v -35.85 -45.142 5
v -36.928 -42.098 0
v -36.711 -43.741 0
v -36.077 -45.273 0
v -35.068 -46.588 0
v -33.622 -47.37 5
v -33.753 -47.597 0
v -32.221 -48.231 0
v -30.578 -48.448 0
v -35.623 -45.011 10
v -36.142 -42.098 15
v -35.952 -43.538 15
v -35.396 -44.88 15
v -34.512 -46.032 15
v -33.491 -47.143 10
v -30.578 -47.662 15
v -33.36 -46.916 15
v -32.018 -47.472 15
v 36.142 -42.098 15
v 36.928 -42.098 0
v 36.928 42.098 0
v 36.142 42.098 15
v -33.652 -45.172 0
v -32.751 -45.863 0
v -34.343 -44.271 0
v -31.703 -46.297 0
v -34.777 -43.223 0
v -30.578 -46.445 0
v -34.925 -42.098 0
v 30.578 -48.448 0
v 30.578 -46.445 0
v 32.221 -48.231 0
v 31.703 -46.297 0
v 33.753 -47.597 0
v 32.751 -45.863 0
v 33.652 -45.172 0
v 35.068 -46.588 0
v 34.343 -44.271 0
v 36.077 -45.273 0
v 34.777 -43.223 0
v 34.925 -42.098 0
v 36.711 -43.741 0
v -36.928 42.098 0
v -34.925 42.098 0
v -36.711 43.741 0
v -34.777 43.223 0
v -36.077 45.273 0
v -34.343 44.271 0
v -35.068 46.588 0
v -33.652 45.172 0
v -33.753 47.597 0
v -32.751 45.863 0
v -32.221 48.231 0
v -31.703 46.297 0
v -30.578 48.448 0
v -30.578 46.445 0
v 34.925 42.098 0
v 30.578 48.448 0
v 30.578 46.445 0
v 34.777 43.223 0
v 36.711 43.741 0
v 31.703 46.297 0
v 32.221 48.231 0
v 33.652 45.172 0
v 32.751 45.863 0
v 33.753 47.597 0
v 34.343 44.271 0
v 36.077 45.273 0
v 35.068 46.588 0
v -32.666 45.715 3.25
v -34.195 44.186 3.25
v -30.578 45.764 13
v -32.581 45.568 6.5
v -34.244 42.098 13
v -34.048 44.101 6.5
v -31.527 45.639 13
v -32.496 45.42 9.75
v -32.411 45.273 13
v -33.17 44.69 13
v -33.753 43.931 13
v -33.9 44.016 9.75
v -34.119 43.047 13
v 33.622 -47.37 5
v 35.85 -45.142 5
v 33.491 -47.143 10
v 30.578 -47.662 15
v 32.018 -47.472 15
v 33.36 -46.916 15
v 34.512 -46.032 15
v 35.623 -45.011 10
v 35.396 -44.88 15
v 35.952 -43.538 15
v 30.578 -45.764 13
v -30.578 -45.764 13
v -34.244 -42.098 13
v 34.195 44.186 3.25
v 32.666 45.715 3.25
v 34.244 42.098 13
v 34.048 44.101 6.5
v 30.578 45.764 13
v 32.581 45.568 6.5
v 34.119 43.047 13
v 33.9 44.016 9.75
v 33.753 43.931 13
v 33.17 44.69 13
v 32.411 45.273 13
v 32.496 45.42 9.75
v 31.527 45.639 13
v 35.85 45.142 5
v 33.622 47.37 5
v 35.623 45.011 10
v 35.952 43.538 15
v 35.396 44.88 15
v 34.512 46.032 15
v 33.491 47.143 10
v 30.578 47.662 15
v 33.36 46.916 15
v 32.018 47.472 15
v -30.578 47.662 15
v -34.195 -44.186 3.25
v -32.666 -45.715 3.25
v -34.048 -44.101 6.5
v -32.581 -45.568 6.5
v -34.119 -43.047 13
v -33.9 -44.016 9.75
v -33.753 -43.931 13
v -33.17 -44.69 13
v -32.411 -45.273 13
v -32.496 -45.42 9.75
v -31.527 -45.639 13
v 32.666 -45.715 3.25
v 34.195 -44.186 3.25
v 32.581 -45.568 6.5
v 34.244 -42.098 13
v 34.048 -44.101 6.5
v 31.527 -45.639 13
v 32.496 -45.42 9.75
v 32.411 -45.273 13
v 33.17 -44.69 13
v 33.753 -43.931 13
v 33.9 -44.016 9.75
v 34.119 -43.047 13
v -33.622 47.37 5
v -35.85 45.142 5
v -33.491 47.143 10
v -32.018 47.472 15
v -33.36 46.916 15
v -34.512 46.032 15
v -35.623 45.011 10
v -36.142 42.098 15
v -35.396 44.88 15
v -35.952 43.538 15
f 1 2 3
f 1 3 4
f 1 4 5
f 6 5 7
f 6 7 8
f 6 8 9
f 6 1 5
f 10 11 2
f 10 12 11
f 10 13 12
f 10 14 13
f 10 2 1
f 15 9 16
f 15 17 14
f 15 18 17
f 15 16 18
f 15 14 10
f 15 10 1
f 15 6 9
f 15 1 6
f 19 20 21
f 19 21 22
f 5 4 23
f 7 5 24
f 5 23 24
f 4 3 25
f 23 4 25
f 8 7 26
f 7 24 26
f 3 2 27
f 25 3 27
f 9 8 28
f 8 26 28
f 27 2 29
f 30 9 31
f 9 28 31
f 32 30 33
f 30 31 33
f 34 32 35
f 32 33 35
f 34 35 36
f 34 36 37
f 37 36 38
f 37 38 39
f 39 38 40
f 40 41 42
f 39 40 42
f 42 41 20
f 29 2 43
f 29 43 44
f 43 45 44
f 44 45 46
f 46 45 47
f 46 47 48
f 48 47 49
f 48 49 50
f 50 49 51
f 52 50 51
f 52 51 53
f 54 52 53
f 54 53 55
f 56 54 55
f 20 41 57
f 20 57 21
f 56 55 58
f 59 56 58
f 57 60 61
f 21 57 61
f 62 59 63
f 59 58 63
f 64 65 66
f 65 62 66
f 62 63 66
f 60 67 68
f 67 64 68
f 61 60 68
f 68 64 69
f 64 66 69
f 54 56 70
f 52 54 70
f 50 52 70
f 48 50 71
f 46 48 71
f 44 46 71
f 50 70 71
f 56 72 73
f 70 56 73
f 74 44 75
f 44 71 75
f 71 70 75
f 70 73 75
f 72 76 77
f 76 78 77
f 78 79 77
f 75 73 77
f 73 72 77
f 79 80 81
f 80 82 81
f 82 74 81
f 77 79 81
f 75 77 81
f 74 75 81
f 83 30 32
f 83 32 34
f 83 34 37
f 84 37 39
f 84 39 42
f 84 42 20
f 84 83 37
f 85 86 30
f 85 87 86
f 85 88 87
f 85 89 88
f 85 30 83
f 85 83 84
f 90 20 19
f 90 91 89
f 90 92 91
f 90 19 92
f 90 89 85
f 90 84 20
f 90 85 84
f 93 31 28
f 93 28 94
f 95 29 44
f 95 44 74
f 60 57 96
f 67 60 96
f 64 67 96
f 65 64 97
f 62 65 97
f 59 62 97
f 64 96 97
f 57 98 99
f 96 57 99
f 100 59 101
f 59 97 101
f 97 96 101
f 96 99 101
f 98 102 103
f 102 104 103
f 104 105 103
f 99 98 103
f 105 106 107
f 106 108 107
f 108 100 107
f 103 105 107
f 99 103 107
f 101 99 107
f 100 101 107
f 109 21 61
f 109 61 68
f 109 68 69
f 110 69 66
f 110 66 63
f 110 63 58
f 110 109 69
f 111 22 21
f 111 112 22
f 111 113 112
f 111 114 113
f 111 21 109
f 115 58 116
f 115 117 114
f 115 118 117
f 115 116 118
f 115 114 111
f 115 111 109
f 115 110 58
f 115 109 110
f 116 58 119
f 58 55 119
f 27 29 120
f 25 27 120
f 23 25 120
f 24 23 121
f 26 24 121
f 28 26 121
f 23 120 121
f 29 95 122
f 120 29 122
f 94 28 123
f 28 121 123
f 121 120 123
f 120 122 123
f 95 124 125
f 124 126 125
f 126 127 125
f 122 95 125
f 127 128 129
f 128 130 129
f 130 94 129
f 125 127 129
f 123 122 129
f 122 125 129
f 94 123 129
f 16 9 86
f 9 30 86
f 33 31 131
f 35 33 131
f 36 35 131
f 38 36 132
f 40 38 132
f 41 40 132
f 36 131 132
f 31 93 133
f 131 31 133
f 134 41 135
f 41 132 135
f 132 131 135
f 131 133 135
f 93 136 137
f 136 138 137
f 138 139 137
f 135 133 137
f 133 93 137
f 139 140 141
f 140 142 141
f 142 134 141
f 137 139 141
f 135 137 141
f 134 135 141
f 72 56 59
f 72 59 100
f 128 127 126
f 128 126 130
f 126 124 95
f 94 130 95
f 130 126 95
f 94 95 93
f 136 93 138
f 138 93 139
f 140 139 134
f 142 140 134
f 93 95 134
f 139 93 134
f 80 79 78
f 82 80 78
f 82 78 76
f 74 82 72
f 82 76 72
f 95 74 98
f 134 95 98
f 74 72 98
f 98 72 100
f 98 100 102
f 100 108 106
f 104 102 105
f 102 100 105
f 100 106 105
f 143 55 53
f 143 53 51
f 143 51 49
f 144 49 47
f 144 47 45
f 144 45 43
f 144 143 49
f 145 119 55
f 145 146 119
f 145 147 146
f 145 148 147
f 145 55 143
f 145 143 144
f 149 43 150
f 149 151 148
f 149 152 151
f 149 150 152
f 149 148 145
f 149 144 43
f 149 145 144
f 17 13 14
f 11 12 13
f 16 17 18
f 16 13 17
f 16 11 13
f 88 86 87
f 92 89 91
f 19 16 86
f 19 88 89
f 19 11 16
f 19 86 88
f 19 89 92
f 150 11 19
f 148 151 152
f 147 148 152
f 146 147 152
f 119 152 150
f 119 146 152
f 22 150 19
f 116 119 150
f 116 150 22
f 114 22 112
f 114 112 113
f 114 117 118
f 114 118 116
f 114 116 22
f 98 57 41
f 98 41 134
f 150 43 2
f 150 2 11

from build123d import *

# Parameters (mm, degrees)
F1_DEPTH = 15
F1_TAPER = 3
F2_T     = -2


with BuildPart() as f1:
    # F0 (on Top) → F1 (new body)
    with BuildSketch(Plane.XY):
        with BuildLine():
            ThreePointArc((36.9276963174, 42.0978697181), (35.067824378, 46.5879977786), (30.5776963174, 48.4478697181))
            Line((30.5776963174, 48.4478697181), (-30.5776963174, 48.4478697181))
            ThreePointArc((-30.5776963174, 48.4478697181), (-35.067824378, 46.5879977786), (-36.9276963174, 42.0978697181))
            Line((-36.9276963174, 42.0978697181), (-36.9276963174, -42.0978697181))
            ThreePointArc((-36.9276963174, -42.0978697181), (-35.067824378, -46.5879977786), (-30.5776963174, -48.4478697181))
            Line((-30.5776963174, -48.4478697181), (30.5776963174, -48.4478697181))
            ThreePointArc((30.5776963174, -48.4478697181), (35.067824378, -46.5879977786), (36.9276963174, -42.0978697181))
            Line((36.9276963174, -42.0978697181), (36.9276963174, 42.0978697181))
        make_face()
    extrude(amount=F1_DEPTH, taper=F1_TAPER)

    # F2
    f2_openings = [f1.faces().sort_by_distance(p)[0] for p in [
        (0, 0, 0),
    ]]
    offset(amount=F2_T, openings=f2_openings)


solid = f1.part
